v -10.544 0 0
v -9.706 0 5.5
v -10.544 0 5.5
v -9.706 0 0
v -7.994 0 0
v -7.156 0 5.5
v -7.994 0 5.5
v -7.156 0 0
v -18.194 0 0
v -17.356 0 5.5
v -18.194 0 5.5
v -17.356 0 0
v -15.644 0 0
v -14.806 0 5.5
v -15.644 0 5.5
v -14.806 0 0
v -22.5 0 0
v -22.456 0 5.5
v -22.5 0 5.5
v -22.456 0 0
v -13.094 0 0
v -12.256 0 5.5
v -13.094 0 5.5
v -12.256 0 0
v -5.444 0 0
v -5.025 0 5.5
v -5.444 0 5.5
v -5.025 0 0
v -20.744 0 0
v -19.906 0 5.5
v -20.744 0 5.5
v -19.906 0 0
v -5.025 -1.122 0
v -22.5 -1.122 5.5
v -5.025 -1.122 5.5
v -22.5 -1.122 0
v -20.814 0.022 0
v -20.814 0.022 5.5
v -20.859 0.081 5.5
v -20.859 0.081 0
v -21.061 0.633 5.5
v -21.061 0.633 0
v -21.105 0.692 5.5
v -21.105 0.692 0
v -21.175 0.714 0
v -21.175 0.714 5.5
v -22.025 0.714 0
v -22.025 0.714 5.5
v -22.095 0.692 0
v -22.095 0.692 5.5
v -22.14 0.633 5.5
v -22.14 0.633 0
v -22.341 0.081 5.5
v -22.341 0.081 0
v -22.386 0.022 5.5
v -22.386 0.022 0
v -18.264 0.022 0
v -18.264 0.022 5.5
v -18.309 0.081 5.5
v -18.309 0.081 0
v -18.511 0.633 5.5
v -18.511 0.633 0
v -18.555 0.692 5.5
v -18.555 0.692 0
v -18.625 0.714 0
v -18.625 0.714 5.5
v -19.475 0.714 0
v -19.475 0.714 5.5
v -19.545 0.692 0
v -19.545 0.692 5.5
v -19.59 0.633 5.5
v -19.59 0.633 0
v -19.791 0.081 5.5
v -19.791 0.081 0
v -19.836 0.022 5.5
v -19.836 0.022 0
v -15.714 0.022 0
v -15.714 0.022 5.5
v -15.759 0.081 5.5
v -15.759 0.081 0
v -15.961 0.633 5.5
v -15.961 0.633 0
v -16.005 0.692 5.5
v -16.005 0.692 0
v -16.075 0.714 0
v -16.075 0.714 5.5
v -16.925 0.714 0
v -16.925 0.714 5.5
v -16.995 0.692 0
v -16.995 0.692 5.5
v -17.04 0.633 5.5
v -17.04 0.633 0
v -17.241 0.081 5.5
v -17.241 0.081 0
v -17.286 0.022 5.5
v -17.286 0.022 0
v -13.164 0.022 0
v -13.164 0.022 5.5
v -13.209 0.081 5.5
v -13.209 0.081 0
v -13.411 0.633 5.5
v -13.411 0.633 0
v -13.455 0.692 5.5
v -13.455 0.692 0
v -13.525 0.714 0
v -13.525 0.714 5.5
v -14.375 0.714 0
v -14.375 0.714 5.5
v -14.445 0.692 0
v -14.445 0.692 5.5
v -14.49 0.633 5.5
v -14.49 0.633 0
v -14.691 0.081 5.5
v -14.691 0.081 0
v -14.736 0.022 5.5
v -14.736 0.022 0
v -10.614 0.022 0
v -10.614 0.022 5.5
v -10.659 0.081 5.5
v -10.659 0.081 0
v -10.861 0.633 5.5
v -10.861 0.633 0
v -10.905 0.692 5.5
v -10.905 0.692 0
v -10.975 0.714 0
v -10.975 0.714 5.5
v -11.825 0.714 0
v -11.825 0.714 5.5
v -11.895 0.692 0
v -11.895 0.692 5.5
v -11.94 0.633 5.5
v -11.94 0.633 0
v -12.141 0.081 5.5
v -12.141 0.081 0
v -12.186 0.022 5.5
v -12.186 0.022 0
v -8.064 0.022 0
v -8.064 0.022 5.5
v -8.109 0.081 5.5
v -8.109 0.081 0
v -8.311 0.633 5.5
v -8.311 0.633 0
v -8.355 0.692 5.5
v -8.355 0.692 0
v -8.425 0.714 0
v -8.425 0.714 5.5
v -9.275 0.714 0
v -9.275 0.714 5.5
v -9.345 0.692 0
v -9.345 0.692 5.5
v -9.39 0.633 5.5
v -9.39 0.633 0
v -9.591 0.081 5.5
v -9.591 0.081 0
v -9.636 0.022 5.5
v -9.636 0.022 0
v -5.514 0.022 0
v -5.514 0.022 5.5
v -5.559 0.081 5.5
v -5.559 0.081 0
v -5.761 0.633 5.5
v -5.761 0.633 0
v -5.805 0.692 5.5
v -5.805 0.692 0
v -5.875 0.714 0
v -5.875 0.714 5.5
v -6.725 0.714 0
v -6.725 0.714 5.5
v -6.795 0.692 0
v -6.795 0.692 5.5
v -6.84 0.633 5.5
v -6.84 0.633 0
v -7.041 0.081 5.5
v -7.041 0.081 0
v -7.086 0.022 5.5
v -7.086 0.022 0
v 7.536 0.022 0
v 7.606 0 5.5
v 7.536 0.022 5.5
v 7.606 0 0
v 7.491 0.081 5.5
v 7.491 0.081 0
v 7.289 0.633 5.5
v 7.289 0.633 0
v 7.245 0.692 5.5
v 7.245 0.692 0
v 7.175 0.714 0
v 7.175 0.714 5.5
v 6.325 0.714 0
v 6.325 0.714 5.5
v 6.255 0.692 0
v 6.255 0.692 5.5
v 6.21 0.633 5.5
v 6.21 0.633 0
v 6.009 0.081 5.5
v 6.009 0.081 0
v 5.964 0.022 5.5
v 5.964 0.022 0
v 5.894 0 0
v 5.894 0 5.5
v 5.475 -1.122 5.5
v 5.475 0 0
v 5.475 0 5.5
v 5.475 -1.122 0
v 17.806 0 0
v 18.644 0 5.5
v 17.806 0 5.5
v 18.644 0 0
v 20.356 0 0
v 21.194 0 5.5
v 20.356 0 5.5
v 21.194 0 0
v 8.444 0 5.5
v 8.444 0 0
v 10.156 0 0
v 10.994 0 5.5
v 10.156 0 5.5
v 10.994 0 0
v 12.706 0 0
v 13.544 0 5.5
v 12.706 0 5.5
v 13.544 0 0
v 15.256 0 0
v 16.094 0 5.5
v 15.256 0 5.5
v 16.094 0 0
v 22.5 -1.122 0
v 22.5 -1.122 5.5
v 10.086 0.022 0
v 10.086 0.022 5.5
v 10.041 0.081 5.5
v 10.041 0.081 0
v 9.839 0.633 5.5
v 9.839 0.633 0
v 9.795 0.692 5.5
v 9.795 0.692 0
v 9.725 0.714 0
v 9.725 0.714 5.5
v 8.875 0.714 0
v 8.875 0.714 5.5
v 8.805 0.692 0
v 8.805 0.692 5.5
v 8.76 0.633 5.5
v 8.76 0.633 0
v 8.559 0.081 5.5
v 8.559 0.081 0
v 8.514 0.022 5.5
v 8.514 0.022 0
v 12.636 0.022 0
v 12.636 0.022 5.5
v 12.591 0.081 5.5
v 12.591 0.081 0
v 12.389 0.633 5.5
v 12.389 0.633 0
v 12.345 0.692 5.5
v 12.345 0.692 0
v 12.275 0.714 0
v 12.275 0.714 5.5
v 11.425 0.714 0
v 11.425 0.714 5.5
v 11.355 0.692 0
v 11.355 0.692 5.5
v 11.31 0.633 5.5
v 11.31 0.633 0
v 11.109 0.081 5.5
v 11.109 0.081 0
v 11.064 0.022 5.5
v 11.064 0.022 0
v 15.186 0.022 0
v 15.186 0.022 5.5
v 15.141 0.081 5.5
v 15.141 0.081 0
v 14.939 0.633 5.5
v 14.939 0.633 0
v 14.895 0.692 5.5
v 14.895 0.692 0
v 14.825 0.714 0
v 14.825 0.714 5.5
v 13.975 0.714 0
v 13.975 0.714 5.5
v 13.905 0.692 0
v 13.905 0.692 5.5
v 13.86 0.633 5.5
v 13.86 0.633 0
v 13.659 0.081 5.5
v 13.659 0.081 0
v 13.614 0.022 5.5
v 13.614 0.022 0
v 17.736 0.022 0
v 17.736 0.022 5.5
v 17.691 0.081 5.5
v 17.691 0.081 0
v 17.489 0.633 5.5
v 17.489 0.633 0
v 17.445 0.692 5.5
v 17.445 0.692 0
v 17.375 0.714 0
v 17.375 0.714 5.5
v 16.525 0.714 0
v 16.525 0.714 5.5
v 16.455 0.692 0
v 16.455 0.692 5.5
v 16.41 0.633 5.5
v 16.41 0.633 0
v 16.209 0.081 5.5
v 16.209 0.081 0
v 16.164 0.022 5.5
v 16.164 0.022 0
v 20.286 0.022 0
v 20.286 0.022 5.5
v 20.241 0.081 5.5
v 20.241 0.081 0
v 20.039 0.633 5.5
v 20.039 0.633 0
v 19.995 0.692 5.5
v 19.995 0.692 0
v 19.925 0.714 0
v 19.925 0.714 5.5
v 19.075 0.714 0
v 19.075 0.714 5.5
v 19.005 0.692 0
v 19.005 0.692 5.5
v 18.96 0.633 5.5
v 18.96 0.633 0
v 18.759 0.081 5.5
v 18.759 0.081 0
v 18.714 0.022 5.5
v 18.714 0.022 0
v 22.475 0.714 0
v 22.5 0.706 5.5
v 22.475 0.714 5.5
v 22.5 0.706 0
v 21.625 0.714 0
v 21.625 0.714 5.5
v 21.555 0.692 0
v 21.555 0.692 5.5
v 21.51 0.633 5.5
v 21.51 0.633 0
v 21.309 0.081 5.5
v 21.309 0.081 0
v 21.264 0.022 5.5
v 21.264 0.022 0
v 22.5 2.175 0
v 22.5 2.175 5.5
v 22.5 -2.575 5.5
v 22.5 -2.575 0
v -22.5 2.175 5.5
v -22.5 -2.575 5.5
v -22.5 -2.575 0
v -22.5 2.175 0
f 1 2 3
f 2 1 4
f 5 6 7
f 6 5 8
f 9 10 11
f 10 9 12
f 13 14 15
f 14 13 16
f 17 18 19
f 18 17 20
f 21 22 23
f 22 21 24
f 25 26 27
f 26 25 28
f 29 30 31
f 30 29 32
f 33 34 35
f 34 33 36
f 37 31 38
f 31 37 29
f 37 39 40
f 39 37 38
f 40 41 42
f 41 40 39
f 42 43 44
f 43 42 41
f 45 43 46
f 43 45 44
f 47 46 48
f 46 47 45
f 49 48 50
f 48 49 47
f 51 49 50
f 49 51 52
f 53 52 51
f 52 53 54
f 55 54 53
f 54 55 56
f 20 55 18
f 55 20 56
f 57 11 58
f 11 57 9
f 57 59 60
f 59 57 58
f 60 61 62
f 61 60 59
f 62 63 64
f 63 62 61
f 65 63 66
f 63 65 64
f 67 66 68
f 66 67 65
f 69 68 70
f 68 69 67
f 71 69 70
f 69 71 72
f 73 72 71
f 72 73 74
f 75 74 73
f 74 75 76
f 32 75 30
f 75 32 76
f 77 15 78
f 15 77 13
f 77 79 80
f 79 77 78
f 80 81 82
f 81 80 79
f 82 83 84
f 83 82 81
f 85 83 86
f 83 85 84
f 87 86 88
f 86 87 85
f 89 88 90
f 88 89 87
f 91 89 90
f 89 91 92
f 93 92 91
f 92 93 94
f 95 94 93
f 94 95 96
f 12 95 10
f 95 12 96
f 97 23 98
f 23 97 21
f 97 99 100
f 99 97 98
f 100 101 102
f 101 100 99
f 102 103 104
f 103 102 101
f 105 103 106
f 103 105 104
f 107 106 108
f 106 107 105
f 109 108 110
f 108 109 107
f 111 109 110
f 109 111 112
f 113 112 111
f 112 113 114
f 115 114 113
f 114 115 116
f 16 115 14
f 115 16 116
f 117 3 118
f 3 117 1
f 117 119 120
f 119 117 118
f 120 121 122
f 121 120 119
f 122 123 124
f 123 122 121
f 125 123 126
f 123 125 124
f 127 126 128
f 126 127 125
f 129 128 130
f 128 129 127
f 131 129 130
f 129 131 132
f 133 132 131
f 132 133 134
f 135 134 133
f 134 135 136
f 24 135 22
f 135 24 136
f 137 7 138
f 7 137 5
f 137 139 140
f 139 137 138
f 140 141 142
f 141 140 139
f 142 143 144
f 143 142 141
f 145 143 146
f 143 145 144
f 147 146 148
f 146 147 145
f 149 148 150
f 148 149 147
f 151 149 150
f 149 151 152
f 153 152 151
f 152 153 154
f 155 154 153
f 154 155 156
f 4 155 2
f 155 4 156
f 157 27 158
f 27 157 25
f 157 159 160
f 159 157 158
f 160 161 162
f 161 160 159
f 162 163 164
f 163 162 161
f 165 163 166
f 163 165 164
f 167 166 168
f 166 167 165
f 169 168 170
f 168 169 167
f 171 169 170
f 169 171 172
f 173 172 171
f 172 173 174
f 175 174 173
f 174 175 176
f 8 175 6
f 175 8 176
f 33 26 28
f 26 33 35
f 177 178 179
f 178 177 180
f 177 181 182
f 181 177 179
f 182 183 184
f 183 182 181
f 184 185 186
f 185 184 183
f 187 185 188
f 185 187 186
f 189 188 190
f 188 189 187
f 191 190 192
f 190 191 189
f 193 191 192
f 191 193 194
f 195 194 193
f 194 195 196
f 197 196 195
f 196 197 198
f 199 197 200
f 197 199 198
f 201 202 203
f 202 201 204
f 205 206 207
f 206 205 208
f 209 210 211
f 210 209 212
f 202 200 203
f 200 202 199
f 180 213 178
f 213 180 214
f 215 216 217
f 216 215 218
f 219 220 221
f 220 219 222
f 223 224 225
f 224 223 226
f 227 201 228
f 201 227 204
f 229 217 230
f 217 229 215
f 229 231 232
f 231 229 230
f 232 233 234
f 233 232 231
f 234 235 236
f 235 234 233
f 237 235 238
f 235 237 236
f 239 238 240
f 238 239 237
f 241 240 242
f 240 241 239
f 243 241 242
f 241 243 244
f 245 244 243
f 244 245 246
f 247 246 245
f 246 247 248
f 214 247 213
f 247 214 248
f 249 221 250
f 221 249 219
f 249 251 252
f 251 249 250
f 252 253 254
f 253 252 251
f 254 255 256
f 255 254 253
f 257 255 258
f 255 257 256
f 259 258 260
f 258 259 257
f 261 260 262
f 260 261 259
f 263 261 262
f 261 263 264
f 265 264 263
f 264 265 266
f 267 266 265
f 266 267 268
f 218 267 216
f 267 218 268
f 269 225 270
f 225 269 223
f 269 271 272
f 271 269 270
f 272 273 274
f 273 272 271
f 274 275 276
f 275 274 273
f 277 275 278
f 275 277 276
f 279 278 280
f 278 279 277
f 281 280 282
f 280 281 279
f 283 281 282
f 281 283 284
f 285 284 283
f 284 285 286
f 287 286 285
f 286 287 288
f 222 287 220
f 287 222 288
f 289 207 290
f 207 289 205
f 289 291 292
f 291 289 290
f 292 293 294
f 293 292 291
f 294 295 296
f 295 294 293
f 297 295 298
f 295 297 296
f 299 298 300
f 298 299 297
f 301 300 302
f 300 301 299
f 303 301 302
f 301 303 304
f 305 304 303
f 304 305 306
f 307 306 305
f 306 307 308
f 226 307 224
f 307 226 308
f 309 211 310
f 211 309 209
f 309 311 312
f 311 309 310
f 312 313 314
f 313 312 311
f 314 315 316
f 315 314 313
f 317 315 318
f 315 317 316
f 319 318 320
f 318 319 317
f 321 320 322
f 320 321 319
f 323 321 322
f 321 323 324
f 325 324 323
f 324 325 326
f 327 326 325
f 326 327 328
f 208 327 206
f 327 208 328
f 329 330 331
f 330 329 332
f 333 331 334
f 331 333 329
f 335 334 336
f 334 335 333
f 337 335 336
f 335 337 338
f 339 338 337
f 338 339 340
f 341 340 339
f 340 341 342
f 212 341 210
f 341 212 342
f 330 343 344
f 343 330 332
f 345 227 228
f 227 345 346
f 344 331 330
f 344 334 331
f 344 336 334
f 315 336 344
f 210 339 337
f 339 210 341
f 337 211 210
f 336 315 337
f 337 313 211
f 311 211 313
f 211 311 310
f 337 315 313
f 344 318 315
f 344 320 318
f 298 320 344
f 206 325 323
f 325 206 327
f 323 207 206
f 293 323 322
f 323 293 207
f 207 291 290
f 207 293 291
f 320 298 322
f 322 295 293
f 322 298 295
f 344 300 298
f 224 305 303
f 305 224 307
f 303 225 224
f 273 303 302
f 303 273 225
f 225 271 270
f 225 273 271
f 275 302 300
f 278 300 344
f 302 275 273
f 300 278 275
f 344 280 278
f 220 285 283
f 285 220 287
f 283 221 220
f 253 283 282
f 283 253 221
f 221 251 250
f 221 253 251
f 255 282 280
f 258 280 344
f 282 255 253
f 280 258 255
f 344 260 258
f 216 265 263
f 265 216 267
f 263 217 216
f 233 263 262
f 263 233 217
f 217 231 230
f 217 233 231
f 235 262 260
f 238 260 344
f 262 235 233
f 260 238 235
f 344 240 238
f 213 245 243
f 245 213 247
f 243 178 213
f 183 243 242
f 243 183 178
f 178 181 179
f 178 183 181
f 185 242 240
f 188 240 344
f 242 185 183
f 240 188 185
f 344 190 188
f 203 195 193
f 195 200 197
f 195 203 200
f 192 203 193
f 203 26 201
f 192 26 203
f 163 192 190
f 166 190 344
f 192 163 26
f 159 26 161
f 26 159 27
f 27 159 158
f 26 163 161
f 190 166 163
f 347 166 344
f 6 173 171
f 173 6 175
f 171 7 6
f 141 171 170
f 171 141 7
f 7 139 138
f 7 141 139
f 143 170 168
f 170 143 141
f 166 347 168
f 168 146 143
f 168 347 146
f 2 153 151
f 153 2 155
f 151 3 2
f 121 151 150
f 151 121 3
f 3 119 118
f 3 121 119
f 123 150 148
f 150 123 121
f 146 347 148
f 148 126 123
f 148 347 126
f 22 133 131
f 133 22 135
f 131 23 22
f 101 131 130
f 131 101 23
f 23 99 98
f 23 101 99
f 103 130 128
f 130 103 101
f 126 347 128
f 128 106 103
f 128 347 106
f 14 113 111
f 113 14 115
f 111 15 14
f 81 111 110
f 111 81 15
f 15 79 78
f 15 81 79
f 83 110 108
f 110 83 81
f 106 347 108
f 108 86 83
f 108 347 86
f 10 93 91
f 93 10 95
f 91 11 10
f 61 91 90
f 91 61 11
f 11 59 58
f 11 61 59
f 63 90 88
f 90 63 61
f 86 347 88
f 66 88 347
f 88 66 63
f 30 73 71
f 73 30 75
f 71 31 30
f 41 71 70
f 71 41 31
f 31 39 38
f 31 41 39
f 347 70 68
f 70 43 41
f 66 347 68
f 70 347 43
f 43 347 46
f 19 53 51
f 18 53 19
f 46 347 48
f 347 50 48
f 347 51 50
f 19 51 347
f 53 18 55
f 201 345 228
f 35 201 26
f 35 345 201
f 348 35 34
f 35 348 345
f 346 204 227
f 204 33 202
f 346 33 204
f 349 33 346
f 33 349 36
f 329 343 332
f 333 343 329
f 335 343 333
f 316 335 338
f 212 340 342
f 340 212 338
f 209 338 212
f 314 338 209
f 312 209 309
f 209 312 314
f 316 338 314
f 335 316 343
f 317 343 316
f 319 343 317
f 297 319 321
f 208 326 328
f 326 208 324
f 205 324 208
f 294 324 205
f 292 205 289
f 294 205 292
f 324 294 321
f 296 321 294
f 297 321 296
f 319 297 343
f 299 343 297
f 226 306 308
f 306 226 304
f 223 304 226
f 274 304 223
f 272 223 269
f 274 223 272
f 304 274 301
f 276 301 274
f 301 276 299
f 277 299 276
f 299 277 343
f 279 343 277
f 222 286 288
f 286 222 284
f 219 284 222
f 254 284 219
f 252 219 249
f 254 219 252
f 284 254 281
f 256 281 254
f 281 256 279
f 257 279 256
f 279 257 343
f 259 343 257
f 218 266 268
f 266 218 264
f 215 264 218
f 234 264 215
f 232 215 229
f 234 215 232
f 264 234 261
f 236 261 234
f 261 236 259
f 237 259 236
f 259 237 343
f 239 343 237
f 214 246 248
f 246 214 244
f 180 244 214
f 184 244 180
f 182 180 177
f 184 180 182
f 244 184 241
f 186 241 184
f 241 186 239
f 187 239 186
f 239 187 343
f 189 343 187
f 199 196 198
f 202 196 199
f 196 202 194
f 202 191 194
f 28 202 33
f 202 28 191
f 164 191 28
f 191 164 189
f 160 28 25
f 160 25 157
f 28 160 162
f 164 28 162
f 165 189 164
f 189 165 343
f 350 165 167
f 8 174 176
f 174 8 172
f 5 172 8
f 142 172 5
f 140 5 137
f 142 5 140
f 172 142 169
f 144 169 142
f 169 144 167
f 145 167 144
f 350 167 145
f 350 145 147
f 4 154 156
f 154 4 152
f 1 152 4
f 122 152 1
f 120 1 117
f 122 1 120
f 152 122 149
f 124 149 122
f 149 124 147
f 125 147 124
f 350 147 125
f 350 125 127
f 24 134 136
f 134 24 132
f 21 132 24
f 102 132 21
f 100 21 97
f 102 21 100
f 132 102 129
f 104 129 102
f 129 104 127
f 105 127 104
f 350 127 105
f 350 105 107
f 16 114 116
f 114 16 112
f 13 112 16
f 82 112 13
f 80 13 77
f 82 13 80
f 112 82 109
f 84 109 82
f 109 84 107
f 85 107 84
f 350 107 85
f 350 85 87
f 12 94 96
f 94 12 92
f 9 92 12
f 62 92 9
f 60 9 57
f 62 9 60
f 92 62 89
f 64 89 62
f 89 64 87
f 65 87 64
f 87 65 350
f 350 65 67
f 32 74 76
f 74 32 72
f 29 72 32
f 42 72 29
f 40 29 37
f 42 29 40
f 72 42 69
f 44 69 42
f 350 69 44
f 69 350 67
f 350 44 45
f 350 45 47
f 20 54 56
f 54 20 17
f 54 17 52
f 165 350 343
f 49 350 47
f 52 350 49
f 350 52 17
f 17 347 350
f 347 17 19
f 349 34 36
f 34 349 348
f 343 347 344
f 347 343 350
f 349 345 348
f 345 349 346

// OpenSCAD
coupler_w = 45;
coupler_h = 4.75;
coupler_d = 5.5;

belt_w = 5.5;
belt_n = 9;
belt_margin = 0.50;

// coupler
difference(){
	translate([0,-0.20,-coupler_d/2+belt_w])cube([coupler_w,coupler_h,coupler_d],center=true);
	for (axis_x = [-1:2:1]) {
		translate([2.00*belt_n*axis_x-11.25,0,-0.01])
			scale(1.02)belt_length(profile = "T2.5", belt_width = belt_w+1, n = belt_n);
	}
}

// belt
for (axis_x = [-1:2:1]) {
	translate([2.00*belt_n*axis_x-11.25,0,-0.01])
		%scale(1.02)belt_length(profile = "T2.5", belt_width = belt_w+1, n = belt_n);
}

//================================================
// Module Section
//================================================
//Outer Module
module belt_length(profile = "T2.5", belt_width = 6, n = 10)
{

			if ( profile == "T2.5" ) 
				{ 
					_belt_length(
						profile=profile, 
						n = n, 
						belt_width = belt_width,
						tooth_pitch = 2.5,
						backing_thickness = 0.6 + belt_margin
						);
				}
			if ( profile == "T5" ) 
				{ 
					_belt_length(
						profile=profile, 
						n = n, 
						belt_width = belt_width,
						tooth_pitch = 5,
						backing_thickness = 1 + belt_margin
						);
				}
			if ( profile == "T10" ) 
				{ 
					_belt_length(
						profile=profile, 
						n = n, 
						belt_width = belt_width,
						tooth_pitch = 10,
						backing_thickness = 2 + belt_margin
						);
				}
			if ( profile == "MXL" ) 
				{ 
					_belt_length(
						profile=profile, 
						n = n, 
						belt_width = belt_width,
						tooth_pitch = 2.032,
						backing_thickness = 0.64 + belt_margin
						);
				}


}

//inner module
module _belt_length(profile = "T2.5", n = 10, belt_width = 5, tooth_pitch = 2.5, backing_thickness = 0.6)
{

for( i = [0:n])
	{
		union(){

			if ( profile == "T2.5" ) { translate([tooth_pitch*i,0,0])T2_5(width = belt_width);}
			if ( profile == "T5" ) { translate([tooth_pitch*i,0,0])T5(width = belt_width);}
			if ( profile == "T10" ) { translate([tooth_pitch*i,0,0])T10(width = belt_width);}
			if ( profile == "MXL" ) { translate([tooth_pitch*i,0,0])MXL(width = belt_width);}
			translate([(tooth_pitch*i)-(tooth_pitch/2),-backing_thickness,0])cube([tooth_pitch,backing_thickness,belt_width]);
		}
	}
}

//Tooth Form modules - Taken from http://www.thingiverse.com/thing:1662
module T2_5(width = 2)
	{
	linear_extrude(height=width) polygon([[-0.839258,-0.5],[-0.839258,0],[-0.770246,0.021652],[-0.726369,0.079022],[-0.529167,0.620889],[-0.485025,0.67826],[-0.416278,0.699911],[0.416278,0.699911],[0.484849,0.67826],[0.528814,0.620889],[0.726369,0.079022],[0.770114,0.021652],[0.839258,0],[0.839258,-0.5]]);
	}

module T5(width = 2)
	{
	linear_extrude(height=width) polygon([[-1.632126,-0.5],[-1.632126,0],[-1.568549,0.004939],[-1.507539,0.019367],[-1.450023,0.042686],[-1.396912,0.074224],[-1.349125,0.113379],[-1.307581,0.159508],[-1.273186,0.211991],[-1.246868,0.270192],[-1.009802,0.920362],[-0.983414,0.978433],[-0.949018,1.030788],[-0.907524,1.076798],[-0.859829,1.115847],[-0.80682,1.147314],[-0.749402,1.170562],[-0.688471,1.184956],[-0.624921,1.189895],[0.624971,1.189895],[0.688622,1.184956],[0.749607,1.170562],[0.807043,1.147314],[0.860055,1.115847],[0.907754,1.076798],[0.949269,1.030788],[0.9837,0.978433],[1.010193,0.920362],[1.246907,0.270192],[1.273295,0.211991],[1.307726,0.159508],[1.349276,0.113379],[1.397039,0.074224],[1.450111,0.042686],[1.507589,0.019367],[1.568563,0.004939],[1.632126,0],[1.632126,-0.5]]);
	}

module T10(width = 2)
	{
	linear_extrude(height=width) polygon([[-3.06511,-1],[-3.06511,0],[-2.971998,0.007239],[-2.882718,0.028344],[-2.79859,0.062396],[-2.720931,0.108479],[-2.651061,0.165675],[-2.590298,0.233065],[-2.539962,0.309732],[-2.501371,0.394759],[-1.879071,2.105025],[-1.840363,2.190052],[-1.789939,2.266719],[-1.729114,2.334109],[-1.659202,2.391304],[-1.581518,2.437387],[-1.497376,2.47144],[-1.408092,2.492545],[-1.314979,2.499784],[1.314979,2.499784],[1.408091,2.492545],[1.497371,2.47144],[1.581499,2.437387],[1.659158,2.391304],[1.729028,2.334109],[1.789791,2.266719],[1.840127,2.190052],[1.878718,2.105025],[2.501018,0.394759],[2.539726,0.309732],[2.59015,0.233065],[2.650975,0.165675],[2.720887,0.108479],[2.798571,0.062396],[2.882713,0.028344],[2.971997,0.007239],[3.06511,0],[3.06511,-1]]);
	}

module MXL(width = 2)
	{
	linear_extrude(height=width) polygon([[-0.660421,-0.5],[-0.660421,0],[-0.621898,0.006033],[-0.587714,0.023037],[-0.560056,0.049424],[-0.541182,0.083609],[-0.417357,0.424392],[-0.398413,0.458752],[-0.370649,0.48514],[-0.336324,0.502074],[-0.297744,0.508035],[0.297744,0.508035],[0.336268,0.502074],[0.370452,0.48514],[0.39811,0.458752],[0.416983,0.424392],[0.540808,0.083609],[0.559752,0.049424],[0.587516,0.023037],[0.621841,0.006033],[0.660421,0],[0.660421,-0.5]]);
	}
